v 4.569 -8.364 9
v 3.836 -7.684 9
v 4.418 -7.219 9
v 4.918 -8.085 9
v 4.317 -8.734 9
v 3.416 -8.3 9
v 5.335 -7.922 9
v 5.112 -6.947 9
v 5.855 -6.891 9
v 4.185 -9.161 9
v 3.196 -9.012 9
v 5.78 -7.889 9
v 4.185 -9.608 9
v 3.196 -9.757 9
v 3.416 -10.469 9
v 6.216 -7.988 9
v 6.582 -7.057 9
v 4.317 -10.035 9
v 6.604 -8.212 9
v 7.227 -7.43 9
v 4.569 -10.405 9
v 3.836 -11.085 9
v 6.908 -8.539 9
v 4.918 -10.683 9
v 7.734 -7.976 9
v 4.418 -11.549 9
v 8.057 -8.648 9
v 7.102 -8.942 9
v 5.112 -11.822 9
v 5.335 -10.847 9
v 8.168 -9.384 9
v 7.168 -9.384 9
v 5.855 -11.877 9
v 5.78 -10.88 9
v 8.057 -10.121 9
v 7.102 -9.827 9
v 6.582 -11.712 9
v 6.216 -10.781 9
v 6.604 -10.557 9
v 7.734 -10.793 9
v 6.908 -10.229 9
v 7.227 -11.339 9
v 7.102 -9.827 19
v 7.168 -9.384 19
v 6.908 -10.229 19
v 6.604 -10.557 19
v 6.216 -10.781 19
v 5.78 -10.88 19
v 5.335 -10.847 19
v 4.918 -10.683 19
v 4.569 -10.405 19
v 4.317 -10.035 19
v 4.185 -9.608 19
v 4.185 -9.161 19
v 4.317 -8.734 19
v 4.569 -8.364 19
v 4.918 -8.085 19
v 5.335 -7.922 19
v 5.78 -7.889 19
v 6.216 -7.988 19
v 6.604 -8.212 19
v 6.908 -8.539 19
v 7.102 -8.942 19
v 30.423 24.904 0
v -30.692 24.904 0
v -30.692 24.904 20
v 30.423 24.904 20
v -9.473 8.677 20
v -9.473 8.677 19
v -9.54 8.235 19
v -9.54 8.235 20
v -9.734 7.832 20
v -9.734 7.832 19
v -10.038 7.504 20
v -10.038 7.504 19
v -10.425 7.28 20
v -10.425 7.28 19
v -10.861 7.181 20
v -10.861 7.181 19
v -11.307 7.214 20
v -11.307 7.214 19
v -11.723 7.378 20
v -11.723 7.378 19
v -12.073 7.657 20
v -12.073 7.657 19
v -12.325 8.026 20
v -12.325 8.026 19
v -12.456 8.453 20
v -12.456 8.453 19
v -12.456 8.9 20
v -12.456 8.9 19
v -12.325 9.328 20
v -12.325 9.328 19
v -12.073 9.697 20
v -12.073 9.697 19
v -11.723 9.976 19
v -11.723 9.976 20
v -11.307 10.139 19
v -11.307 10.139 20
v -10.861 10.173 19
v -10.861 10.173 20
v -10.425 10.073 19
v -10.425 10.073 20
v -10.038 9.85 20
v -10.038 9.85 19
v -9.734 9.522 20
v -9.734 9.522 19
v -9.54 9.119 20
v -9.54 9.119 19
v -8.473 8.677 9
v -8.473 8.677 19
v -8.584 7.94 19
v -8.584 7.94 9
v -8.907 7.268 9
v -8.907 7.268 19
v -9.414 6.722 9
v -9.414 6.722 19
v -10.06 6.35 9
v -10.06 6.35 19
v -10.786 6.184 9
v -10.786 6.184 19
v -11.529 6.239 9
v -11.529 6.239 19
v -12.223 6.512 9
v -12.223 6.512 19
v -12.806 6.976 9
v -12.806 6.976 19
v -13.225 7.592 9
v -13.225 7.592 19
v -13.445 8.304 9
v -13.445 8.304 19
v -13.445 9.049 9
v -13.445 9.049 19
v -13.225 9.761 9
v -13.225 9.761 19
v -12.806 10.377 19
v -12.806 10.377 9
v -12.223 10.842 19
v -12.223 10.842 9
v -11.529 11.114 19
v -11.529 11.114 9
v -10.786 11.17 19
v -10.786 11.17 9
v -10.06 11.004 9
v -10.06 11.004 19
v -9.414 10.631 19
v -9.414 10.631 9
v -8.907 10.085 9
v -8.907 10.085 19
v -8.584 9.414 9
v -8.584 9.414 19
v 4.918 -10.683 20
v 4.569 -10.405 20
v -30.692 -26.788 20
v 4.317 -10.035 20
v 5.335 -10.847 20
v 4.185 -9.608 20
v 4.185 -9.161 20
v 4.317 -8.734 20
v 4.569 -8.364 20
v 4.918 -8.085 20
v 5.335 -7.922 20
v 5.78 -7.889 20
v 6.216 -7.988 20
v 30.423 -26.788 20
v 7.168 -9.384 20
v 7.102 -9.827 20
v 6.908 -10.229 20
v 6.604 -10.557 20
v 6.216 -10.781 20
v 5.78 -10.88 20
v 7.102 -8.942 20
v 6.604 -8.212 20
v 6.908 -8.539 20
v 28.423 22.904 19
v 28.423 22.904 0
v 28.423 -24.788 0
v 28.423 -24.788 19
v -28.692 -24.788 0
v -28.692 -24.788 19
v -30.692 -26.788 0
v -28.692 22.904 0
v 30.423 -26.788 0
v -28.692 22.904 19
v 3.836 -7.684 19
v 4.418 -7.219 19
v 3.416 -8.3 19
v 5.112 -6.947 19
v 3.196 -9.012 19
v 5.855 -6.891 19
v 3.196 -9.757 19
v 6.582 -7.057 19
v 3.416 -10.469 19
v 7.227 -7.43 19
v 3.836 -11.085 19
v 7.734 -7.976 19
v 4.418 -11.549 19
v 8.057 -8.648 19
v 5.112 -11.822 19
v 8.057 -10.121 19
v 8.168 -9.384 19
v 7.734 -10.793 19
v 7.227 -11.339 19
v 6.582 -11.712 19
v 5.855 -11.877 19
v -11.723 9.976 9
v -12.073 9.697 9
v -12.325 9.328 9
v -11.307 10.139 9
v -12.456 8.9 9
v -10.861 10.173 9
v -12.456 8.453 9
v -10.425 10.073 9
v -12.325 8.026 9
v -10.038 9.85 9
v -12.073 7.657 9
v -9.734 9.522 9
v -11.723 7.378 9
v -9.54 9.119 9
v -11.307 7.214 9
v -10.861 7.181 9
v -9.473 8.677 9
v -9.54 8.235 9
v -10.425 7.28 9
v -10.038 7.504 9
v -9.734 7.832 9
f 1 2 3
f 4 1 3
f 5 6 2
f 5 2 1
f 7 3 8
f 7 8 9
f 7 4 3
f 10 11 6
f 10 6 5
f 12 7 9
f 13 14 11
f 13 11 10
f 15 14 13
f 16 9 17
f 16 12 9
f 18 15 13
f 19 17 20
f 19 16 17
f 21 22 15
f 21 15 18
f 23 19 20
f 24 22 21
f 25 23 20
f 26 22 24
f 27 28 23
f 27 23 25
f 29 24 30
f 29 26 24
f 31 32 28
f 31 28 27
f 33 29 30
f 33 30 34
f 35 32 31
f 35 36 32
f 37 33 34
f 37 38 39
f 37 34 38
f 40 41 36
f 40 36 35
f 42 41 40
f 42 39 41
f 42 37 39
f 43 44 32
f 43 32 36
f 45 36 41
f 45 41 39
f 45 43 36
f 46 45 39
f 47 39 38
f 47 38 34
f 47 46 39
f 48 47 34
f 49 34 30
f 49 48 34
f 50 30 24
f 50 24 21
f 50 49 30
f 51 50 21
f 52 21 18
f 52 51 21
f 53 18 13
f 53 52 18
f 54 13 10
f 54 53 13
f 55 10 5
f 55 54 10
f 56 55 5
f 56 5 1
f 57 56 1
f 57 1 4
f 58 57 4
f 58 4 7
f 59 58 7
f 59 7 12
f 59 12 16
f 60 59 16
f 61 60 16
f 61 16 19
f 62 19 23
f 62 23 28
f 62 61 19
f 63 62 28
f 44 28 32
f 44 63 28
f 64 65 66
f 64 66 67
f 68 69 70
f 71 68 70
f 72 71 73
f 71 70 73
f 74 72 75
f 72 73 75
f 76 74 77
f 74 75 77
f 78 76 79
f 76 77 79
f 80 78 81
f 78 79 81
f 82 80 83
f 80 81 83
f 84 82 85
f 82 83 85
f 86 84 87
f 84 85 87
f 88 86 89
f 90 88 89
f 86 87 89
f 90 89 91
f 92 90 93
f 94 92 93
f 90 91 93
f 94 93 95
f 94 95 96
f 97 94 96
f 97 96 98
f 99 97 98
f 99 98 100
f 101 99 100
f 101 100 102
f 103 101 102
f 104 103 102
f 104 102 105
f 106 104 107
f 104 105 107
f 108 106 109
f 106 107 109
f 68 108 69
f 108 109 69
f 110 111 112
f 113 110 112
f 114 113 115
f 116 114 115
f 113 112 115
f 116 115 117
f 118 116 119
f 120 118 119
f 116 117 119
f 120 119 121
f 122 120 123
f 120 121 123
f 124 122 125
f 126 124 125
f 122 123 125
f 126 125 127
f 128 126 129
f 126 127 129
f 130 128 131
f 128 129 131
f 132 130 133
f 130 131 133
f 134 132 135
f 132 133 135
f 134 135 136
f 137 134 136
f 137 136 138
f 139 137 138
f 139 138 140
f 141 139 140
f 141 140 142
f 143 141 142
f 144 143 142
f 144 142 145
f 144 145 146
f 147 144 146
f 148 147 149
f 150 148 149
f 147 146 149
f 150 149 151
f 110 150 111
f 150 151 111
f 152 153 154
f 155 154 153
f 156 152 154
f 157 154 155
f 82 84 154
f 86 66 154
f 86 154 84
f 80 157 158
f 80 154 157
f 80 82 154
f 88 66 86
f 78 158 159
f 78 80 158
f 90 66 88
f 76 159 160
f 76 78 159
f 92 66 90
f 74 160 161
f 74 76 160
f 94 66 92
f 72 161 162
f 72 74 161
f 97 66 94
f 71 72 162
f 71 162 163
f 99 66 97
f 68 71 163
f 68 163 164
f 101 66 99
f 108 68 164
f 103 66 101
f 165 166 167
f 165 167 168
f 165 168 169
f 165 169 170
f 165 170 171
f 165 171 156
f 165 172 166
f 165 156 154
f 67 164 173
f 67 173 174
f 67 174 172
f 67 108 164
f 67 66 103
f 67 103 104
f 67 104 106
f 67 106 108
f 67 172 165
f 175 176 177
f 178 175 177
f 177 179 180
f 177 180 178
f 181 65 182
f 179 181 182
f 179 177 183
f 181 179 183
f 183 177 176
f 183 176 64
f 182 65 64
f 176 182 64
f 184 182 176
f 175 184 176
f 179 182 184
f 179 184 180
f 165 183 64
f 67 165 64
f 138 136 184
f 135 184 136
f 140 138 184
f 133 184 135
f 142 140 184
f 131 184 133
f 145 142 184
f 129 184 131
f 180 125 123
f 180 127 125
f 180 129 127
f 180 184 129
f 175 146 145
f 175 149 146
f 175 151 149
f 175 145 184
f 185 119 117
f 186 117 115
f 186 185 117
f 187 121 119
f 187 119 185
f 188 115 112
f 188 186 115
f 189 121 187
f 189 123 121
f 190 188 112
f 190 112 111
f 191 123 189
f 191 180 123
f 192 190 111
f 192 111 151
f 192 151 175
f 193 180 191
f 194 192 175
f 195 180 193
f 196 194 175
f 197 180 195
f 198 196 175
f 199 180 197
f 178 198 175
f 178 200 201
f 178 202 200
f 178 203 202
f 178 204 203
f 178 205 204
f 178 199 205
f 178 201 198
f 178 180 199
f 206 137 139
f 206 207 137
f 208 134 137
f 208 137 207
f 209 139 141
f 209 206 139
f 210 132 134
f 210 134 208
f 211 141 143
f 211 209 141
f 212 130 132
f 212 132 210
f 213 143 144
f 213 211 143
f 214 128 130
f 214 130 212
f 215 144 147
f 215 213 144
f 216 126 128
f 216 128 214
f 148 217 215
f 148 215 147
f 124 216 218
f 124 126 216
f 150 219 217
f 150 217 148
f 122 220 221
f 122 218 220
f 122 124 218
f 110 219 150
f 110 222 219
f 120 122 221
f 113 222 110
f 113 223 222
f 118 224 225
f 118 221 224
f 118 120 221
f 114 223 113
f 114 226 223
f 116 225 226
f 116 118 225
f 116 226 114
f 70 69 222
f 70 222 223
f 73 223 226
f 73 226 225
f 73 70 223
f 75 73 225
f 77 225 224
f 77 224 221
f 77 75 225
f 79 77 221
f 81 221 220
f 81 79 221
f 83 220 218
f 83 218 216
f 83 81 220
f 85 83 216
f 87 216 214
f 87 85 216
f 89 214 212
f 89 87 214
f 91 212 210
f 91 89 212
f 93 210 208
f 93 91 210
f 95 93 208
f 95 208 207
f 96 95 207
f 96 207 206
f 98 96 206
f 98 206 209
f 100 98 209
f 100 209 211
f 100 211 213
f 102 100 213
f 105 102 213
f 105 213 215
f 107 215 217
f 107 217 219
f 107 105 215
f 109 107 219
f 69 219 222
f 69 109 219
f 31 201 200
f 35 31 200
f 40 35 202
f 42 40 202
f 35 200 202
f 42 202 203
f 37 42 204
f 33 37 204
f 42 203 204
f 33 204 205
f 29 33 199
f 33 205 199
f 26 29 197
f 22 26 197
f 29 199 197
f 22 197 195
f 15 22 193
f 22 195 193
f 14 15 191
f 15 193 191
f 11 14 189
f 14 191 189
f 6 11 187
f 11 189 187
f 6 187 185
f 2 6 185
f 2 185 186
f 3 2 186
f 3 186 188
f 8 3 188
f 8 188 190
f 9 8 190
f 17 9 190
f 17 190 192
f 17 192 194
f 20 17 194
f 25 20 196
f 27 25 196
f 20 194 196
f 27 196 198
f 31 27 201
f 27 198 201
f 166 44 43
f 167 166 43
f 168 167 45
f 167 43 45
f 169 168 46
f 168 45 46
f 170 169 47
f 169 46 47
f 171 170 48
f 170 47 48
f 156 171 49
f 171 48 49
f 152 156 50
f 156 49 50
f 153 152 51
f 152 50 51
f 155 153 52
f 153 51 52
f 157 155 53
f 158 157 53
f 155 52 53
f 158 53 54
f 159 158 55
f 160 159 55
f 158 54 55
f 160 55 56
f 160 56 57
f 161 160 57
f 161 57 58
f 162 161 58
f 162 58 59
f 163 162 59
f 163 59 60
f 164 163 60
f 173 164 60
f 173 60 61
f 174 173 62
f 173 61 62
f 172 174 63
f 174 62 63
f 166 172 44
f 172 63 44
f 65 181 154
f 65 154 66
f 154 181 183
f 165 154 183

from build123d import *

# Parameters (mm, degrees)
F0_W     = 61.1153859645
F0_H     = 51.6923125833
F1_DEPTH = 20
F2_W     = 57.1153859645
F2_H     = 47.6923125833
F3_DEPTH = 19
F4_R     = 2.5
F4_R_2   = 1.5
F5_DEPTH = 10
F6_DEPTH = 1


# Not quite as in the source:
# - a feature of the source that left no trace in its solid (it failed there, or was rolled back) is left out


with BuildPart() as f1:
    # F0 (on Top) → F1 (new body)
    with BuildSketch(Plane.XY):
        with Locations((-0.1346161589, -0.9423075244)):
            Rectangle(F0_W, F0_H)
    extrude(amount=F1_DEPTH)

    # F2 (on face) → F3 (cut)
    with BuildSketch(Plane(origin=(0, 0, 0), x_dir=(1, 0, 0), z_dir=(0, 0, -1))):
        with Locations((-0.1346161589, 0.9423075244)):
            Rectangle(F2_W, F2_H)
    extrude(amount=-F3_DEPTH, mode=Mode.SUBTRACT)

    # F4 (on face) → F5 (join)
    with BuildSketch(Plane(origin=(0, 0, 19), x_dir=(1, 0, 0), z_dir=(0, 0, -1))):
        with Locations((-10.9730726108, -8.6767822504)):
            Circle(F4_R)
        with Locations((-10.9730726108, -8.6767822504)):
            Circle(F4_R_2, mode=Mode.SUBTRACT)
        with Locations((5.6683224998, 9.3844144205)):
            Circle(F4_R)
        with Locations((5.6683224998, 9.3844144205)):
            Circle(F4_R_2, mode=Mode.SUBTRACT)
    extrude(amount=F5_DEPTH)

    # F6 (cut): faces of the model
    f6_faces = [f1.faces().sort_by_distance(p)[0] for p in [
        (-10.9730726108, 8.6767822504, 19),
        (5.6683224998, -9.3844144205, 19),
    ]]
    extrude(f6_faces, amount=-F6_DEPTH, mode=Mode.SUBTRACT)


solid = f1.part
